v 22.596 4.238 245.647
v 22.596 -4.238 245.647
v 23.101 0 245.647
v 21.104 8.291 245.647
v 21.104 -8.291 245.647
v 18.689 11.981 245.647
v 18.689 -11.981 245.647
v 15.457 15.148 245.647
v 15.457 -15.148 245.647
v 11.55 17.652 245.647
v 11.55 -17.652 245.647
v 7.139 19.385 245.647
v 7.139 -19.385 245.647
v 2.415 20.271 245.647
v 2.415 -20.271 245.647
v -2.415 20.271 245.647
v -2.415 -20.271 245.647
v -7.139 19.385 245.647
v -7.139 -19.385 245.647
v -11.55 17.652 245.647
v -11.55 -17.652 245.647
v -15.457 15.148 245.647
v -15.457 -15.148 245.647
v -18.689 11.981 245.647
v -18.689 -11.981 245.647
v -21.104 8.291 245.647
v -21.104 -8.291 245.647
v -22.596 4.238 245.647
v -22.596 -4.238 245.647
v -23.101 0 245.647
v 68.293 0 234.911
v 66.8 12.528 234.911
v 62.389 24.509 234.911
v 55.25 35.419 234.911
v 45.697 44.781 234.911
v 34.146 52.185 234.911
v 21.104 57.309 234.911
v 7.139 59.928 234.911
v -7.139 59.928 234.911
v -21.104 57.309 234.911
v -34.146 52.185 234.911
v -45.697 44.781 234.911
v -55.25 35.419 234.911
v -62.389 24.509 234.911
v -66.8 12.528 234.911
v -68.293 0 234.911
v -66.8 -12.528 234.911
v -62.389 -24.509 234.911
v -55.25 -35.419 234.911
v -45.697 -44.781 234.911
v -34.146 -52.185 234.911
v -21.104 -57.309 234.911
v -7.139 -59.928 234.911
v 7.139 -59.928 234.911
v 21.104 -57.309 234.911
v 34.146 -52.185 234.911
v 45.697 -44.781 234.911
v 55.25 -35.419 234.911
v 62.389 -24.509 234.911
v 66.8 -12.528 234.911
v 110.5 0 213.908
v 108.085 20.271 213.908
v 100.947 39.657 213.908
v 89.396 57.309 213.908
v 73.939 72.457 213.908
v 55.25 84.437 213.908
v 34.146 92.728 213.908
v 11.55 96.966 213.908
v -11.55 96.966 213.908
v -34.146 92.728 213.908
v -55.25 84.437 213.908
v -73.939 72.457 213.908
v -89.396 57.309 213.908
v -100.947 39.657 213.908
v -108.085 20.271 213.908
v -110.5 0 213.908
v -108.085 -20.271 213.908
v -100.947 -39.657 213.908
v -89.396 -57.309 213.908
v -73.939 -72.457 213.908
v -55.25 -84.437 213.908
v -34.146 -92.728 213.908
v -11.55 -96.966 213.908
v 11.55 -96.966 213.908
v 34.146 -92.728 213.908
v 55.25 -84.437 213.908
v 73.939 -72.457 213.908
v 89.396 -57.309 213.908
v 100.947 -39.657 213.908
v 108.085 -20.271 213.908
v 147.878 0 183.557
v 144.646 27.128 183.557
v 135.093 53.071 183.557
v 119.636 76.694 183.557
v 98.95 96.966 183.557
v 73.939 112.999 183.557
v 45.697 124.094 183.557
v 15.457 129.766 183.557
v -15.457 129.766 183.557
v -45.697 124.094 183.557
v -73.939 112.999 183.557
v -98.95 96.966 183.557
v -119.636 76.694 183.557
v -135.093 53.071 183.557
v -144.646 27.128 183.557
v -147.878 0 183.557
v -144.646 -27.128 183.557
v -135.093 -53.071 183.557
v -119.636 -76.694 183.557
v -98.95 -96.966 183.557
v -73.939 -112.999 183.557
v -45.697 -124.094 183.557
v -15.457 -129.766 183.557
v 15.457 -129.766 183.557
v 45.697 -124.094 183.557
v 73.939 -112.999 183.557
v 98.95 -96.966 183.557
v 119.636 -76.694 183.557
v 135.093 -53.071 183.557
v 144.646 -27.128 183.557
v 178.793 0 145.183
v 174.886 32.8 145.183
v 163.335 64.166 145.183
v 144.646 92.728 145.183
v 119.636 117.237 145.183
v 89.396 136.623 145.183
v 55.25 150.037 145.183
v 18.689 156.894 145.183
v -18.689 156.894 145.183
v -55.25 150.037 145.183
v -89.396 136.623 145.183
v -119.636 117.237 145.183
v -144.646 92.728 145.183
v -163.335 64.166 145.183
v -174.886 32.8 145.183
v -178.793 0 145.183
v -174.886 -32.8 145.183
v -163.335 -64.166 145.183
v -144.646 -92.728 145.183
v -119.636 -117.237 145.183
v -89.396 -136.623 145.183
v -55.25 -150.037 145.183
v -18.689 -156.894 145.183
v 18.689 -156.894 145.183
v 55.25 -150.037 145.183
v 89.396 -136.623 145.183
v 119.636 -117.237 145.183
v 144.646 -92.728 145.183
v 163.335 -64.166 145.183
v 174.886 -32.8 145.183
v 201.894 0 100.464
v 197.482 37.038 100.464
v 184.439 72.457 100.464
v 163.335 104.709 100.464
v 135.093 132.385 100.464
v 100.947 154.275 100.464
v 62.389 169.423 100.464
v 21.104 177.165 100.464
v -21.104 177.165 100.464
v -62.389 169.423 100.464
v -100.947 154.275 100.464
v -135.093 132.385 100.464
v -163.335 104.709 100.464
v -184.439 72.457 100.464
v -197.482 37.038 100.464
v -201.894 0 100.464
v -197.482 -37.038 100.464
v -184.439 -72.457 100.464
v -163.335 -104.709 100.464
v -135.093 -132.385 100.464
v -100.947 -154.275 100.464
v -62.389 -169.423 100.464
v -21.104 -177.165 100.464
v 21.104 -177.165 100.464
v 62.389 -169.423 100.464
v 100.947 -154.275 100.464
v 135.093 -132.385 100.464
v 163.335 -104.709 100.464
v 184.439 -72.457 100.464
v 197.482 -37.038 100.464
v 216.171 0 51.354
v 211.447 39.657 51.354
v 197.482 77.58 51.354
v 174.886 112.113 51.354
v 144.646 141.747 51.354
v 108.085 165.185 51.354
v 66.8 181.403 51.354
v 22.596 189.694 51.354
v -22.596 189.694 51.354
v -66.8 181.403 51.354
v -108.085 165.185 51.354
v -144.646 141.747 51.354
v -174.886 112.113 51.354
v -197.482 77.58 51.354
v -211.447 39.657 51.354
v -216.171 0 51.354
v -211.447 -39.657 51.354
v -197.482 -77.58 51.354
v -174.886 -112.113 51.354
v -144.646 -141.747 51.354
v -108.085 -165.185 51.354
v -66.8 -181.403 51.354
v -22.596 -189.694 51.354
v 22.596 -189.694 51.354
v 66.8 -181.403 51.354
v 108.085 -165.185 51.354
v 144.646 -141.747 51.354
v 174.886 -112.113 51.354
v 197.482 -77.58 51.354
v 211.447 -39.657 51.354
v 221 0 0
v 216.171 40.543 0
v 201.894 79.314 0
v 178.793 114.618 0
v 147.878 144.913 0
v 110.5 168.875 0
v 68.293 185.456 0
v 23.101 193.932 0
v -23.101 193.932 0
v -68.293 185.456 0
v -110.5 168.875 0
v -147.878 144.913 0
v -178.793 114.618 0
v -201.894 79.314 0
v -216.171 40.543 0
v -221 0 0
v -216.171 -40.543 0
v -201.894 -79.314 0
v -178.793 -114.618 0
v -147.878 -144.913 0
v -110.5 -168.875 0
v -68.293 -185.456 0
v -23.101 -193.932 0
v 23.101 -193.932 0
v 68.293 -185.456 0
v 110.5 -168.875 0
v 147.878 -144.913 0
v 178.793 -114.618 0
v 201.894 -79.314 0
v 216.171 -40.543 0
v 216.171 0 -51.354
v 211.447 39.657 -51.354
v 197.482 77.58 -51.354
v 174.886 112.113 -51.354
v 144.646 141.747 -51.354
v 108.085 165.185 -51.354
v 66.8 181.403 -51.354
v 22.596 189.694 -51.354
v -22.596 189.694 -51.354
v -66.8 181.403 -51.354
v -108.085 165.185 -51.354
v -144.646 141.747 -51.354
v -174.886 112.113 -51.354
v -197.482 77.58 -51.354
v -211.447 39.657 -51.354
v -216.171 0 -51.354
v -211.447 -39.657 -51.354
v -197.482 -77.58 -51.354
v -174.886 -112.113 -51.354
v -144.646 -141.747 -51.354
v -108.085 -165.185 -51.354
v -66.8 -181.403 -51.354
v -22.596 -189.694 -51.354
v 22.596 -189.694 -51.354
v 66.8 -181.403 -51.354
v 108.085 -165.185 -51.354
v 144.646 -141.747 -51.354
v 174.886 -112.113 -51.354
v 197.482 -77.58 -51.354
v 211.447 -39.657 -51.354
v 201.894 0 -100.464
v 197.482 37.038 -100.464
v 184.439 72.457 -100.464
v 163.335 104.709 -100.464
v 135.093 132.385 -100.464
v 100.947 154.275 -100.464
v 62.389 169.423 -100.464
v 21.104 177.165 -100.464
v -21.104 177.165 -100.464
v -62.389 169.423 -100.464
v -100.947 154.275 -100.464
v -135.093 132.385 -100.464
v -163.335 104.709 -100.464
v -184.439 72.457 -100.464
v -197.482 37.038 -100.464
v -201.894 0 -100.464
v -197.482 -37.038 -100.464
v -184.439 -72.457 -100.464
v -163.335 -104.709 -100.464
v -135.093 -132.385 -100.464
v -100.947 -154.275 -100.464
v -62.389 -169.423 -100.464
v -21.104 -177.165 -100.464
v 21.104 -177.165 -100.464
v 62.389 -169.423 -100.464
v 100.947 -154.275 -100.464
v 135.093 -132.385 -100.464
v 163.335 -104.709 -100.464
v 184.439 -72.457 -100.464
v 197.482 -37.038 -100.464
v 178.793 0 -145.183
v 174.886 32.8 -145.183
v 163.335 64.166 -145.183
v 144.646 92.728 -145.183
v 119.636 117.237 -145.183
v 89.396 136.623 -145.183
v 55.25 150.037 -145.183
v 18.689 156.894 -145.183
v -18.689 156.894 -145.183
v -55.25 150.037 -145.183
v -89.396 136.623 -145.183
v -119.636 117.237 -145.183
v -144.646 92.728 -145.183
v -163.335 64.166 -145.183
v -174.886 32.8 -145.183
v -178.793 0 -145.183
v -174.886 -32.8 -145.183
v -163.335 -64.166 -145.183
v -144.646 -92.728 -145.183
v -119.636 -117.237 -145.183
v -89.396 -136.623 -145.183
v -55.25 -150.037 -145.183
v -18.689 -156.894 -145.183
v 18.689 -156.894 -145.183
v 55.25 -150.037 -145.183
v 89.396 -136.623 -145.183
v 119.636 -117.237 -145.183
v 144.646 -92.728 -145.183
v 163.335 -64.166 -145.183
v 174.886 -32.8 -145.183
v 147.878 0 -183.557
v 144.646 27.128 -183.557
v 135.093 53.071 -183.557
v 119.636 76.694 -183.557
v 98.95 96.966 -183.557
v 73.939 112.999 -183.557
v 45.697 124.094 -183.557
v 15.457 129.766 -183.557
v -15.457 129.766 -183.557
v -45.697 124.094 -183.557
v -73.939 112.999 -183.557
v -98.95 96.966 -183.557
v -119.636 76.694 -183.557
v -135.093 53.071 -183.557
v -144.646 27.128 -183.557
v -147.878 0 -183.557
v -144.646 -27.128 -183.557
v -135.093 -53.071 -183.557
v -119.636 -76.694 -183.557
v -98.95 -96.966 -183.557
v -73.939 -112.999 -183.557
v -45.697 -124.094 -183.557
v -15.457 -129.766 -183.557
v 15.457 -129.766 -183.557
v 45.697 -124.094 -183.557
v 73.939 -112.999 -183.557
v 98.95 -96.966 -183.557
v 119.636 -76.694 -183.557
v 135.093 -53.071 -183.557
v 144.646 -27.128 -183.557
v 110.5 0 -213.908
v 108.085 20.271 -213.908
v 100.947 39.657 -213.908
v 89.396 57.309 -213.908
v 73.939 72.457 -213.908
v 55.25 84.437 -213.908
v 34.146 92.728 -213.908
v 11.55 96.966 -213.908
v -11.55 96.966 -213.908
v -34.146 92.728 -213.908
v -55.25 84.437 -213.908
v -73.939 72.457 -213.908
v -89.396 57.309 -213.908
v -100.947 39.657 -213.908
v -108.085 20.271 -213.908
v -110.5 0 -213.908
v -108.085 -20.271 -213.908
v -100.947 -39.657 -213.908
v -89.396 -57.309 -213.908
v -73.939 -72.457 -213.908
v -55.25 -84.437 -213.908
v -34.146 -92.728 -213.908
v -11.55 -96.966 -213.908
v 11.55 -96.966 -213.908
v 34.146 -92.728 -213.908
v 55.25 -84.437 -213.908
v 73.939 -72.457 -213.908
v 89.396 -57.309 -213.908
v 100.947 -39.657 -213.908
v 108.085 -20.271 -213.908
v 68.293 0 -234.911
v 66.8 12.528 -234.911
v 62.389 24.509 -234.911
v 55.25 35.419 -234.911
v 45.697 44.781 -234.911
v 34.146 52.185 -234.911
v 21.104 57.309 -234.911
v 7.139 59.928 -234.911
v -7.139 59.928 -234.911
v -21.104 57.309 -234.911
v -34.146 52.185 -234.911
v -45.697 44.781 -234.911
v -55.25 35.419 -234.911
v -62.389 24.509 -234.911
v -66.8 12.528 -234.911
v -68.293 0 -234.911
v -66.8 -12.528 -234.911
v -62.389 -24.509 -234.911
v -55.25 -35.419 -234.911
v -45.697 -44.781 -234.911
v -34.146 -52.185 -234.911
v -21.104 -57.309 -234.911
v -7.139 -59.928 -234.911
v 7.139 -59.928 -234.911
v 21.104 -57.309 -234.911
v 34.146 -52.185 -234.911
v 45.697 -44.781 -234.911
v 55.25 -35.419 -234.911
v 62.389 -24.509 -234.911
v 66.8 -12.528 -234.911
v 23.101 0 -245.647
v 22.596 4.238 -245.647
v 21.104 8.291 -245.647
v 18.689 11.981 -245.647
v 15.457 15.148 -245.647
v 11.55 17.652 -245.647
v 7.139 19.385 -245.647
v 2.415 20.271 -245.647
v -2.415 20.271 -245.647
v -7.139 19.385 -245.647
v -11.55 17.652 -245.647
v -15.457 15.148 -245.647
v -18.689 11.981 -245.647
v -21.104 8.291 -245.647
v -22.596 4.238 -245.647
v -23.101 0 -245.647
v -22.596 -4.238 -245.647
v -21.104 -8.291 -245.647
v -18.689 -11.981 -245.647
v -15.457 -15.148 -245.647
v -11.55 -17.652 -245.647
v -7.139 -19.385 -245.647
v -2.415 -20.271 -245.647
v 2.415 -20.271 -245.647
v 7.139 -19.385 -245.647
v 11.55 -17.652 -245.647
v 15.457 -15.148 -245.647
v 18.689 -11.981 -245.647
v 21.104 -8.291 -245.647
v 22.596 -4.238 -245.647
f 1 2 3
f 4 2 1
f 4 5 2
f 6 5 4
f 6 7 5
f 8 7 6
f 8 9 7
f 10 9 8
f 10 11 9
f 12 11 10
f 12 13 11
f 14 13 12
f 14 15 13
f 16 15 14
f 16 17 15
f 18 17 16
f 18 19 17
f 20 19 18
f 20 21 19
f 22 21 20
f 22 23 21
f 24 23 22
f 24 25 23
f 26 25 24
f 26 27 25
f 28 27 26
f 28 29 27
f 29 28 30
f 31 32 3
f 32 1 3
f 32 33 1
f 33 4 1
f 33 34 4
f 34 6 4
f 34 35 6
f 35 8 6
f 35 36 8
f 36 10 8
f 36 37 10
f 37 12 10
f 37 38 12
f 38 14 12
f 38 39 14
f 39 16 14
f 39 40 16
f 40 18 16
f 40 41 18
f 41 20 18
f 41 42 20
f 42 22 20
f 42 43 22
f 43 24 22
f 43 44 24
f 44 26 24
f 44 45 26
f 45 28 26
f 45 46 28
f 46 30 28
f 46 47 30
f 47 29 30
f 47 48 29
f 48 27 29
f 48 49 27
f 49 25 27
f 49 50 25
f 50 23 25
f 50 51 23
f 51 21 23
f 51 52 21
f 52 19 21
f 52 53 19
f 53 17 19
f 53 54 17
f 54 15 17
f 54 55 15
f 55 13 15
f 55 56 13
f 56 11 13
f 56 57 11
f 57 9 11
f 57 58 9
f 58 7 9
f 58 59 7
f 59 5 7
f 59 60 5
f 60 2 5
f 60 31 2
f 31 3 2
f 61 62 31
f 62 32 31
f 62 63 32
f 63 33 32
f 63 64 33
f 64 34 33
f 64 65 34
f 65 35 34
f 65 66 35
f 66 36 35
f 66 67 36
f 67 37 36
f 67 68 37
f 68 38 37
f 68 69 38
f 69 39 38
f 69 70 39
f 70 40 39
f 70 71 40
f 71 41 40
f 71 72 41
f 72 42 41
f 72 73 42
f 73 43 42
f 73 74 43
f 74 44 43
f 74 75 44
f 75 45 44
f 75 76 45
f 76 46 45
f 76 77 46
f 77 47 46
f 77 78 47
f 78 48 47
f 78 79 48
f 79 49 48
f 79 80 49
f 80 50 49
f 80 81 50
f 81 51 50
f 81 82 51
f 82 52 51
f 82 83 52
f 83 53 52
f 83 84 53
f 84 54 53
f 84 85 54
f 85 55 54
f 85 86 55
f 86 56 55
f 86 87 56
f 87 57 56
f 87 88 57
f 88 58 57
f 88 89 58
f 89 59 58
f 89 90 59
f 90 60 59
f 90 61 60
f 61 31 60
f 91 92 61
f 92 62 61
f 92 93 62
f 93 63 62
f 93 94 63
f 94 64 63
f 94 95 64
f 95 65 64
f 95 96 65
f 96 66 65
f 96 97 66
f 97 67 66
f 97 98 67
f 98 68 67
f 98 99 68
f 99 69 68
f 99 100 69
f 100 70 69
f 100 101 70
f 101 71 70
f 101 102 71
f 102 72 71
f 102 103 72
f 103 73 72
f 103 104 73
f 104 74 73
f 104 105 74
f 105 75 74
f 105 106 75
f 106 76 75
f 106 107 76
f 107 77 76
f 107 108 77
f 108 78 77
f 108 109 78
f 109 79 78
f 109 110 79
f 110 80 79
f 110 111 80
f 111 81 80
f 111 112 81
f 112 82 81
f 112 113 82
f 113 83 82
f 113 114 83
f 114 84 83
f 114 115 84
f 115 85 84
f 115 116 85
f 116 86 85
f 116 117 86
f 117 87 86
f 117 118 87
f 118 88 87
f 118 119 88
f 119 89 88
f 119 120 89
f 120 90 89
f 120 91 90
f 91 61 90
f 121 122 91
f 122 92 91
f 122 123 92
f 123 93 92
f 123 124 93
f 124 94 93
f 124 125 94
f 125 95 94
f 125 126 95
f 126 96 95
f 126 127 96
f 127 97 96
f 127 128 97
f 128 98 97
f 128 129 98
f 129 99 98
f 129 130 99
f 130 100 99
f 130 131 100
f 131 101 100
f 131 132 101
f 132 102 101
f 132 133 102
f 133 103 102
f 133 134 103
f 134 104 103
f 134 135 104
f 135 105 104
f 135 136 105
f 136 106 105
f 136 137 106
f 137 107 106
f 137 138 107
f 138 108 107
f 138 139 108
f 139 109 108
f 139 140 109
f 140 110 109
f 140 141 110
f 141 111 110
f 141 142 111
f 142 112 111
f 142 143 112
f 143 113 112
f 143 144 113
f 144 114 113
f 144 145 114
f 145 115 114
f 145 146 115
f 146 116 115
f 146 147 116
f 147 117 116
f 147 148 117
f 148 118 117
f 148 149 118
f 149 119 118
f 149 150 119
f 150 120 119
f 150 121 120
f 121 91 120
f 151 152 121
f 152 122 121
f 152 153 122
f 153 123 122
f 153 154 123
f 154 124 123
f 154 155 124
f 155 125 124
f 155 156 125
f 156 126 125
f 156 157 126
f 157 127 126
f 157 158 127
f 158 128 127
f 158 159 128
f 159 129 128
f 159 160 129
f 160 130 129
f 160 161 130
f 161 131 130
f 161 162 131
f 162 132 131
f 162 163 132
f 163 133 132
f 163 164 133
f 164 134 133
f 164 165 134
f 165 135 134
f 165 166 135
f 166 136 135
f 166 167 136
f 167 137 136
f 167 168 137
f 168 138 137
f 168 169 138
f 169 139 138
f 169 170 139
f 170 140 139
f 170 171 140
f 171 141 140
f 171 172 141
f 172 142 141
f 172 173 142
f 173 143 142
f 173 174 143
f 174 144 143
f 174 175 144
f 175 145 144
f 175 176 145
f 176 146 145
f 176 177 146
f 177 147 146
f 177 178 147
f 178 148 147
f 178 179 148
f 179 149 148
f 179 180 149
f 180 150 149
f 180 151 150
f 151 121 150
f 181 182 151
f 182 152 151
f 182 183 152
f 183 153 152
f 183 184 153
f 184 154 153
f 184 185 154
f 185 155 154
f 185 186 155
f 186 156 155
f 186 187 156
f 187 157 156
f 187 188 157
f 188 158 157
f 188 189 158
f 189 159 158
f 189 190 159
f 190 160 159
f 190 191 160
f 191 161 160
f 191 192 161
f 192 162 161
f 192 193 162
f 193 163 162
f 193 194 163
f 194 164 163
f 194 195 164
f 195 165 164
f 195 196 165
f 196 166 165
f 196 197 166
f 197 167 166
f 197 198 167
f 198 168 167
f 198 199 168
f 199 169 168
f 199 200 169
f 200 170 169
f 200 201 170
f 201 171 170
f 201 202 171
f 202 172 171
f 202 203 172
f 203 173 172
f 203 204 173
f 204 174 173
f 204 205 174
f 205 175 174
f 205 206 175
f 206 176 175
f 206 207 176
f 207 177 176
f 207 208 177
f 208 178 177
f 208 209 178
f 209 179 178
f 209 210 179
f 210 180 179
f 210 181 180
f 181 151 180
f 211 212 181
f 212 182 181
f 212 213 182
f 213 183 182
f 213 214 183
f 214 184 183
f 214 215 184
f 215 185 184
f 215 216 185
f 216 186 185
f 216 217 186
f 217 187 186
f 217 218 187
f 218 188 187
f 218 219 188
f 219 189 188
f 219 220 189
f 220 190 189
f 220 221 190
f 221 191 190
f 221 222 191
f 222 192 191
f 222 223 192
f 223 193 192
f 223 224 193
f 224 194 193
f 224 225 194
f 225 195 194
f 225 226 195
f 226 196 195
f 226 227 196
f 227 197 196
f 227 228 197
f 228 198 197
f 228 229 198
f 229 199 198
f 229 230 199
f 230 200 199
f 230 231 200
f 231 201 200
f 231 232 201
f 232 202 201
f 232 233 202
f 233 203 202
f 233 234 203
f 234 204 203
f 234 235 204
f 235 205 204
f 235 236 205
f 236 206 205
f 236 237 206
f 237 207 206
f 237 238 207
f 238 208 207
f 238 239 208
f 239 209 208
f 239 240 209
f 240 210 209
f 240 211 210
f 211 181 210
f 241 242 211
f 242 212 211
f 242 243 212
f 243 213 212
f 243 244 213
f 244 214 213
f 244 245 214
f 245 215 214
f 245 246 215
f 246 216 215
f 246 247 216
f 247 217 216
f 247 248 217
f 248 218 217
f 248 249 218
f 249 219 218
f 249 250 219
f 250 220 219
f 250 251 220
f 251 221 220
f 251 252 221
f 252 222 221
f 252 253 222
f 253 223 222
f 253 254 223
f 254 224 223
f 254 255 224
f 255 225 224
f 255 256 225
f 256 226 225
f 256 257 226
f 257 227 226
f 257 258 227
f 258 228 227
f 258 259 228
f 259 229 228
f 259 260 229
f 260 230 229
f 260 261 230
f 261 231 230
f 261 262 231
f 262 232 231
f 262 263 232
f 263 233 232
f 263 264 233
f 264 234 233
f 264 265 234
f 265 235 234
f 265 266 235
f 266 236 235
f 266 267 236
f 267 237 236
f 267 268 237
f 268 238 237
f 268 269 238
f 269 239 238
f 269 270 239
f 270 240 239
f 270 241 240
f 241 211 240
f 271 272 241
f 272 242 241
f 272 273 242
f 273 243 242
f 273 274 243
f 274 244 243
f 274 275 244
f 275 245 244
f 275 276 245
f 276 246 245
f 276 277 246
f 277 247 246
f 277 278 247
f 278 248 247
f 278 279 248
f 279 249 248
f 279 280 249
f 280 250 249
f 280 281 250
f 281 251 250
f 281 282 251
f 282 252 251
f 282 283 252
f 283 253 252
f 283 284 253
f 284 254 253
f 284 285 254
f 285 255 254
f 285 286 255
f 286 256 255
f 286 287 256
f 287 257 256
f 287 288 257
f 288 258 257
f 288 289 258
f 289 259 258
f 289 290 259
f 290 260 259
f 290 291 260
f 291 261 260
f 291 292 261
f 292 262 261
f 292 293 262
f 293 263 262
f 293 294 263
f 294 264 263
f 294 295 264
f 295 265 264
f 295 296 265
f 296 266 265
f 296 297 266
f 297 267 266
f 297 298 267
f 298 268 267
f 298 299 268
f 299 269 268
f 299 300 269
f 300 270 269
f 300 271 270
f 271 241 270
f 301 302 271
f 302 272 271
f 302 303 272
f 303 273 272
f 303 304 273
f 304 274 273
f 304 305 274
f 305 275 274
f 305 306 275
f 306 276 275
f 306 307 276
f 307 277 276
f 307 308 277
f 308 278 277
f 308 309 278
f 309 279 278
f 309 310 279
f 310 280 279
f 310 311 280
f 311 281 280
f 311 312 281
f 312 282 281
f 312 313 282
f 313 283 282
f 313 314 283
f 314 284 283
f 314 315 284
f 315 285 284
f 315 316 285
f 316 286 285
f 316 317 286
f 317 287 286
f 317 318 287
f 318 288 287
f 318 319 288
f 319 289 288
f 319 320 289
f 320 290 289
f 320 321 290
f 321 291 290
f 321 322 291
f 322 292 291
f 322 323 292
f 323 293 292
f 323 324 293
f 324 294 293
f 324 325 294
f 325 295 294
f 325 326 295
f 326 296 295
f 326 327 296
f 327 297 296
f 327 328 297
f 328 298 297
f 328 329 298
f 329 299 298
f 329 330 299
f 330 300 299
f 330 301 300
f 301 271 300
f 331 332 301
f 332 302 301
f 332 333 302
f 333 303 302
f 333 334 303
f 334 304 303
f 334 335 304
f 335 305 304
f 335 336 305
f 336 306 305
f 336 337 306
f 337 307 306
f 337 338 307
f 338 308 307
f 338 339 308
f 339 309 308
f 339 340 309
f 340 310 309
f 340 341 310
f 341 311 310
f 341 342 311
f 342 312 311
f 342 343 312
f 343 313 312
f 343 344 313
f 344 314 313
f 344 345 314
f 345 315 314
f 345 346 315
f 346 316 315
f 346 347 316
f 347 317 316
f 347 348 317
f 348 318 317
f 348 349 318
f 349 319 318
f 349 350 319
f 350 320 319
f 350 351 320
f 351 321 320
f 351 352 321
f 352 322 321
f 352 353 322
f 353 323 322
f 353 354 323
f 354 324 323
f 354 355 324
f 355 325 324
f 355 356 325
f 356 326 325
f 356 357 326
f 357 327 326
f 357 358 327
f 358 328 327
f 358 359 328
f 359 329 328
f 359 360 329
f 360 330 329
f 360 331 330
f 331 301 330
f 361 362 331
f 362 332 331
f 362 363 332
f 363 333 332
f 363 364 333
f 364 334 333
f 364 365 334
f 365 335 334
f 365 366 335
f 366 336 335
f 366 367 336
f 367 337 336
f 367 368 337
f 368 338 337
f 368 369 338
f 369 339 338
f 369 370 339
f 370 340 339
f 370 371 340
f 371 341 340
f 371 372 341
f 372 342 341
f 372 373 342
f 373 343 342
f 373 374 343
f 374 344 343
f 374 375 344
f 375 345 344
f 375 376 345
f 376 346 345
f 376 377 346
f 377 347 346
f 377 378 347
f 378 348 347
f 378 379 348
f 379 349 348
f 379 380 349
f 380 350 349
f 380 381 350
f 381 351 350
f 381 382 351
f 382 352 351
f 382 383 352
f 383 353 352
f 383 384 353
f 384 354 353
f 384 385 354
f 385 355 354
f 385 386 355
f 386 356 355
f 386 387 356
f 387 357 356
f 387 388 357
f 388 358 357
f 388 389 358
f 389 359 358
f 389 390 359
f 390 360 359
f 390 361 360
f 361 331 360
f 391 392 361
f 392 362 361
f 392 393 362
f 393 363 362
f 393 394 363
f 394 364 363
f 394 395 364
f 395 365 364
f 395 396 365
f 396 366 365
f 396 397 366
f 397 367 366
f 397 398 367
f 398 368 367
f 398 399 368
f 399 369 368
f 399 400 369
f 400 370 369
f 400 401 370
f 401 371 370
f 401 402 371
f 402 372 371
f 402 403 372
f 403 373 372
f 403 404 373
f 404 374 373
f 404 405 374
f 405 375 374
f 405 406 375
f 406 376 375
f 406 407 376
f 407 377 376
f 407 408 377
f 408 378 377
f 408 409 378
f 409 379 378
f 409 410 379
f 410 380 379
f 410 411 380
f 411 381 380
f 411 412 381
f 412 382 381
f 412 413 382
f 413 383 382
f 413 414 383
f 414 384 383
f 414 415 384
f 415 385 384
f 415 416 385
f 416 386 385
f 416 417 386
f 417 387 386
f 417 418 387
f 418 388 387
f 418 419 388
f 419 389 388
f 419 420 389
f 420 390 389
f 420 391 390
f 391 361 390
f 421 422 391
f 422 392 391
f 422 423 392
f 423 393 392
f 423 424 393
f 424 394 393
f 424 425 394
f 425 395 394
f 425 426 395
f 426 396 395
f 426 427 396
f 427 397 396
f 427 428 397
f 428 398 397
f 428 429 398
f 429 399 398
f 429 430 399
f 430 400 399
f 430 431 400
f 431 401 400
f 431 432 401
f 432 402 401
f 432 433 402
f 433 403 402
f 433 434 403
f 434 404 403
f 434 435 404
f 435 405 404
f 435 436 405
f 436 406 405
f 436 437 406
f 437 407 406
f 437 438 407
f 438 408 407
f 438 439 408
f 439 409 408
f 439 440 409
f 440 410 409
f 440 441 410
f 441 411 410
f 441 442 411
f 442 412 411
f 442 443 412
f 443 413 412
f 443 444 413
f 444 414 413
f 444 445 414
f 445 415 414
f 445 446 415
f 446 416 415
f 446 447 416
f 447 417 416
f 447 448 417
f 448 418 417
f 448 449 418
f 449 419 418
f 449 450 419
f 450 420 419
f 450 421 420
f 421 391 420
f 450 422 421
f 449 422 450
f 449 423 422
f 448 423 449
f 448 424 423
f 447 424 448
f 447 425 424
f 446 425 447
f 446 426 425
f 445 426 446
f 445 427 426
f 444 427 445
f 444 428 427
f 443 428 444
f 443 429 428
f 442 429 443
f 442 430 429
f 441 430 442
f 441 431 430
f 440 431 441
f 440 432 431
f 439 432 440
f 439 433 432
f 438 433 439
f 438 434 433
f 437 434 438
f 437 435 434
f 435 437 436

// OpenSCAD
// Generated by SolidPython 1.0.1 on 2020-07-29 00:46:53


scale(v = [17, 15, 19]) {
	sphere(r = 13);
}
/***********************************************
*********      SolidPython code:      **********
************************************************
 
# import packages: SolidPython
from solid import *
from solid.utils import *
from itertools import chain, combinations, permutations


class Resize:

    def __init__(self, scad_file):
        self.scad_file = scad_file
        #self.scad_file = import_scad(scad_file)
        # cone/cylinder param:
        self.r1 = 0
        self.r2 = 0
        self.h = 0
        # rectangular prism param:
        self.w = 0
        self.l = 0
        # ellipse param:
        self.r = 0

    # import OpenScad code (file name corresponds to shape)


    # classify shape + parameters
    def assign(self, param1, param2, param3):
        if self.scad_file == 'cone.scad':
            self.r1 = param1
            self.r2 = param2
            self.h = param3
        elif self.scad_file == 'cylinder.scad':
            self.r1 = param1
            self.r2 = param2
            self.h = param3
        elif self.scad_file == 'rectangularPrism.scad':
            self.h = param1
            self.l = param2
            self.w = param3
        else:
            self.r = param1
            self.h = param2

    # resize parameters
    def iterate(self):
        x = range(3, 20, 2)
        i = 1
        if self.scad_file == 'cone.scad':
            tempList = list(permutations(x, 2))
            for temp in tempList:
                param1 = temp[0]
                param2 = temp[1]
                filepath = 'produced_scad_files/' + 'cone' + str(param1) + '_' + str(param2) + '_' + '.scad'
                scad_render_to_file(cylinder(h=param1, r1=param2, r2=0), filepath)

        elif self.scad_file == 'cylinder.scad':
            tempList = list(permutations(x, 3))
            for temp in tempList:
                param1 = temp[0]
                param2 = temp[1]
                filepath = 'produced_scad_files/' + 'cylinder' + str(param1) + '_' + str(param2) + '_' + '.scad'
                scad_render_to_file(cylinder(h=param1, r1=param2, r2=param2), filepath)

        elif self.scad_file == 'rectangularPrism.scad':
            tempList = list(permutations(x, 3))
            for temp in tempList:
                param1 = temp[0]
                param2 = temp[1]
                param3 = temp[2]
                filepath = 'produced_scad_files/' + 'rectangularPrism' + str(param1) + '_' + str(param2) + '_' + str(
                    param3) + '.scad'
                scad_render_to_file(cube(size=(param1, param2, param3)), filepath)

        elif self.scad_file == 'ellipse.scad':
            tempList = list(permutations(x, 4))
            for temp in tempList:
                param1 = temp[0]
                param2 = temp[1]
                param3 = temp[2]
                param4 = temp[3]
                filepath = 'produced_scad_files/' + 'ellipse' + str(param1) + '_' + str(param2) + '_' + str(param3) + '_' + str(param4) + '.scad'
                scad_render_to_file(scale([param1, param2, param3])(sphere(r=param4)), filepath)

    def render_to_scadfile(self):
        scad_render_to_file(scad, 'example.scad') 
 
************************************************/
